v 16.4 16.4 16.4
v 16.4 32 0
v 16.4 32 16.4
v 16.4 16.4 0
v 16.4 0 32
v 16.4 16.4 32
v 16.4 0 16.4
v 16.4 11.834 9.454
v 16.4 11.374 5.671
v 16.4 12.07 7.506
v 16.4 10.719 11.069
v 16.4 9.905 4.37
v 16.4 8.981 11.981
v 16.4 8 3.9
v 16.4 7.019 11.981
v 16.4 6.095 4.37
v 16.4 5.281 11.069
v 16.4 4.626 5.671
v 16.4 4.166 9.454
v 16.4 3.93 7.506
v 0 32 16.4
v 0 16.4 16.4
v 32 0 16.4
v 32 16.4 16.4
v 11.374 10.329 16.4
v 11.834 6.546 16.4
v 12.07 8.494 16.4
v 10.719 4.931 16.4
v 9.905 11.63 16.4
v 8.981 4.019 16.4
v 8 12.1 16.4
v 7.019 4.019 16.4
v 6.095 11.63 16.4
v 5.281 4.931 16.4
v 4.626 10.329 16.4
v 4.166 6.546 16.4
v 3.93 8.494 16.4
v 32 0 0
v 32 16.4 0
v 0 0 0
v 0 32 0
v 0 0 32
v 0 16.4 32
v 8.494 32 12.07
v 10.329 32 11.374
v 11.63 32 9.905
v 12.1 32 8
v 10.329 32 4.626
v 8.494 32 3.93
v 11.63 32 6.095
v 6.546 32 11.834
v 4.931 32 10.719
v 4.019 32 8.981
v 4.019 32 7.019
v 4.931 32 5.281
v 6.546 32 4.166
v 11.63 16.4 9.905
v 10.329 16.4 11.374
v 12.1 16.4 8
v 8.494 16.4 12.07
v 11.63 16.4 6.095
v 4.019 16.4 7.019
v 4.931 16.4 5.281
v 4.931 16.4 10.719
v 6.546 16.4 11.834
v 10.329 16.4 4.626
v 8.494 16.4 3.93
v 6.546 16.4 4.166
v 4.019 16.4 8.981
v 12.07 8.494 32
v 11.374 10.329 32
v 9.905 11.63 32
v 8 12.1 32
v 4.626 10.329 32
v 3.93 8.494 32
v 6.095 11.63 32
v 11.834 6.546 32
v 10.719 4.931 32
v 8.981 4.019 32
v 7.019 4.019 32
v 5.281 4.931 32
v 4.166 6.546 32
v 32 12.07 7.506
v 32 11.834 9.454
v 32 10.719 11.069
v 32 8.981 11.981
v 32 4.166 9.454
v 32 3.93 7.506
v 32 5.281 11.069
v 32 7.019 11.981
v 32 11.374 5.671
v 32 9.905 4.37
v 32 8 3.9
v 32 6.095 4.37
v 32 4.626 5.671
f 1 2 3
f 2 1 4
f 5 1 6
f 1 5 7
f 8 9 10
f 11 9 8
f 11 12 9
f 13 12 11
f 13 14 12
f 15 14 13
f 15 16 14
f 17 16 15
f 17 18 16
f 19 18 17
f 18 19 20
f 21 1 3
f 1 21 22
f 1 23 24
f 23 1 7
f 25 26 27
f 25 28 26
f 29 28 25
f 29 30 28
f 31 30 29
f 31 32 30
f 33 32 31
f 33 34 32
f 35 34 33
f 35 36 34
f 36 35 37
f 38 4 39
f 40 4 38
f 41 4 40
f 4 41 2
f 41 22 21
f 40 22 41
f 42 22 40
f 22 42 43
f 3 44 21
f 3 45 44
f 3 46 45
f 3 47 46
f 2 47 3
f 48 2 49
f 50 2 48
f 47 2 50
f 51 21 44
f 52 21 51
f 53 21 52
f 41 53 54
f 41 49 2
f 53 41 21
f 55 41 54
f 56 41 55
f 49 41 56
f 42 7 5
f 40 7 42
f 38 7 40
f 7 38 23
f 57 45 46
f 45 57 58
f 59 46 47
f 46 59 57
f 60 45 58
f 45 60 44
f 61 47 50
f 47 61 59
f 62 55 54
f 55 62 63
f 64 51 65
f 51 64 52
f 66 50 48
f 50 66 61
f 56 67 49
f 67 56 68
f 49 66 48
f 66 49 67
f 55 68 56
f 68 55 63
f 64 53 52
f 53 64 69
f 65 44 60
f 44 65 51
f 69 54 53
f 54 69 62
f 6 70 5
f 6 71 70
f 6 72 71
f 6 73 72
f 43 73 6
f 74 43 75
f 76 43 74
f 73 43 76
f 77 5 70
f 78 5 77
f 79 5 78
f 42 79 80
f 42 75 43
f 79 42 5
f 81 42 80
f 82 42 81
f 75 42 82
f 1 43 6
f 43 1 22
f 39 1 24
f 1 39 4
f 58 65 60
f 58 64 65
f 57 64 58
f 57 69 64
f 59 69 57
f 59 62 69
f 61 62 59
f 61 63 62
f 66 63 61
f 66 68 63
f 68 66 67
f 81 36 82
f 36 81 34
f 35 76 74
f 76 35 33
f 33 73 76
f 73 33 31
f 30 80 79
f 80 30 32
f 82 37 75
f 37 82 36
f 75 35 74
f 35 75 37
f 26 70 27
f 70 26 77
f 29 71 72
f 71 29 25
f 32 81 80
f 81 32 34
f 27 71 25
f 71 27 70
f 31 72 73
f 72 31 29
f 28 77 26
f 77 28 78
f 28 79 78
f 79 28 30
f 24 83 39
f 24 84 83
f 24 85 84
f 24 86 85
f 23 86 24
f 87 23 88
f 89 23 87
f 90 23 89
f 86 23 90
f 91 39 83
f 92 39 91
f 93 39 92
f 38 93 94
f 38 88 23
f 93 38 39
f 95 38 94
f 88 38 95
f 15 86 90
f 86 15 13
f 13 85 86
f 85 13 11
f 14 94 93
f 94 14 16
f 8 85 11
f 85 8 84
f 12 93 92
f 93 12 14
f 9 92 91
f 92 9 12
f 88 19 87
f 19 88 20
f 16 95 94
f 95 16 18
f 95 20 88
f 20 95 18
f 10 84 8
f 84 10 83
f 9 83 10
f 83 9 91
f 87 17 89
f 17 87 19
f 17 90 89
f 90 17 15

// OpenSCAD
// Corner.scad
// The corner piece to hold 3 wooden bars
radius = 4.1;   // radius of the wooden bar
x = radius * 4; // dimentions for the cubic pieces
z = radius * 4;
y = 32;

union (){
difference (){
    cube([x, y, z]);
    translate([8, 16+16, 8])
    rotate([90,0,0])
    cylinder (h = y/2, r = radius);
}

difference (){
    cube([z, x, y]);
    translate([8, 8, 16])
    rotate([0,0,90])
    cylinder (h = y/2, r = radius);
}

difference (){
    cube([y, z, x]); 
    translate([16, 8, 8])
    rotate([0,90,0])
    cylinder (h = y/2, r = radius);
}

}
